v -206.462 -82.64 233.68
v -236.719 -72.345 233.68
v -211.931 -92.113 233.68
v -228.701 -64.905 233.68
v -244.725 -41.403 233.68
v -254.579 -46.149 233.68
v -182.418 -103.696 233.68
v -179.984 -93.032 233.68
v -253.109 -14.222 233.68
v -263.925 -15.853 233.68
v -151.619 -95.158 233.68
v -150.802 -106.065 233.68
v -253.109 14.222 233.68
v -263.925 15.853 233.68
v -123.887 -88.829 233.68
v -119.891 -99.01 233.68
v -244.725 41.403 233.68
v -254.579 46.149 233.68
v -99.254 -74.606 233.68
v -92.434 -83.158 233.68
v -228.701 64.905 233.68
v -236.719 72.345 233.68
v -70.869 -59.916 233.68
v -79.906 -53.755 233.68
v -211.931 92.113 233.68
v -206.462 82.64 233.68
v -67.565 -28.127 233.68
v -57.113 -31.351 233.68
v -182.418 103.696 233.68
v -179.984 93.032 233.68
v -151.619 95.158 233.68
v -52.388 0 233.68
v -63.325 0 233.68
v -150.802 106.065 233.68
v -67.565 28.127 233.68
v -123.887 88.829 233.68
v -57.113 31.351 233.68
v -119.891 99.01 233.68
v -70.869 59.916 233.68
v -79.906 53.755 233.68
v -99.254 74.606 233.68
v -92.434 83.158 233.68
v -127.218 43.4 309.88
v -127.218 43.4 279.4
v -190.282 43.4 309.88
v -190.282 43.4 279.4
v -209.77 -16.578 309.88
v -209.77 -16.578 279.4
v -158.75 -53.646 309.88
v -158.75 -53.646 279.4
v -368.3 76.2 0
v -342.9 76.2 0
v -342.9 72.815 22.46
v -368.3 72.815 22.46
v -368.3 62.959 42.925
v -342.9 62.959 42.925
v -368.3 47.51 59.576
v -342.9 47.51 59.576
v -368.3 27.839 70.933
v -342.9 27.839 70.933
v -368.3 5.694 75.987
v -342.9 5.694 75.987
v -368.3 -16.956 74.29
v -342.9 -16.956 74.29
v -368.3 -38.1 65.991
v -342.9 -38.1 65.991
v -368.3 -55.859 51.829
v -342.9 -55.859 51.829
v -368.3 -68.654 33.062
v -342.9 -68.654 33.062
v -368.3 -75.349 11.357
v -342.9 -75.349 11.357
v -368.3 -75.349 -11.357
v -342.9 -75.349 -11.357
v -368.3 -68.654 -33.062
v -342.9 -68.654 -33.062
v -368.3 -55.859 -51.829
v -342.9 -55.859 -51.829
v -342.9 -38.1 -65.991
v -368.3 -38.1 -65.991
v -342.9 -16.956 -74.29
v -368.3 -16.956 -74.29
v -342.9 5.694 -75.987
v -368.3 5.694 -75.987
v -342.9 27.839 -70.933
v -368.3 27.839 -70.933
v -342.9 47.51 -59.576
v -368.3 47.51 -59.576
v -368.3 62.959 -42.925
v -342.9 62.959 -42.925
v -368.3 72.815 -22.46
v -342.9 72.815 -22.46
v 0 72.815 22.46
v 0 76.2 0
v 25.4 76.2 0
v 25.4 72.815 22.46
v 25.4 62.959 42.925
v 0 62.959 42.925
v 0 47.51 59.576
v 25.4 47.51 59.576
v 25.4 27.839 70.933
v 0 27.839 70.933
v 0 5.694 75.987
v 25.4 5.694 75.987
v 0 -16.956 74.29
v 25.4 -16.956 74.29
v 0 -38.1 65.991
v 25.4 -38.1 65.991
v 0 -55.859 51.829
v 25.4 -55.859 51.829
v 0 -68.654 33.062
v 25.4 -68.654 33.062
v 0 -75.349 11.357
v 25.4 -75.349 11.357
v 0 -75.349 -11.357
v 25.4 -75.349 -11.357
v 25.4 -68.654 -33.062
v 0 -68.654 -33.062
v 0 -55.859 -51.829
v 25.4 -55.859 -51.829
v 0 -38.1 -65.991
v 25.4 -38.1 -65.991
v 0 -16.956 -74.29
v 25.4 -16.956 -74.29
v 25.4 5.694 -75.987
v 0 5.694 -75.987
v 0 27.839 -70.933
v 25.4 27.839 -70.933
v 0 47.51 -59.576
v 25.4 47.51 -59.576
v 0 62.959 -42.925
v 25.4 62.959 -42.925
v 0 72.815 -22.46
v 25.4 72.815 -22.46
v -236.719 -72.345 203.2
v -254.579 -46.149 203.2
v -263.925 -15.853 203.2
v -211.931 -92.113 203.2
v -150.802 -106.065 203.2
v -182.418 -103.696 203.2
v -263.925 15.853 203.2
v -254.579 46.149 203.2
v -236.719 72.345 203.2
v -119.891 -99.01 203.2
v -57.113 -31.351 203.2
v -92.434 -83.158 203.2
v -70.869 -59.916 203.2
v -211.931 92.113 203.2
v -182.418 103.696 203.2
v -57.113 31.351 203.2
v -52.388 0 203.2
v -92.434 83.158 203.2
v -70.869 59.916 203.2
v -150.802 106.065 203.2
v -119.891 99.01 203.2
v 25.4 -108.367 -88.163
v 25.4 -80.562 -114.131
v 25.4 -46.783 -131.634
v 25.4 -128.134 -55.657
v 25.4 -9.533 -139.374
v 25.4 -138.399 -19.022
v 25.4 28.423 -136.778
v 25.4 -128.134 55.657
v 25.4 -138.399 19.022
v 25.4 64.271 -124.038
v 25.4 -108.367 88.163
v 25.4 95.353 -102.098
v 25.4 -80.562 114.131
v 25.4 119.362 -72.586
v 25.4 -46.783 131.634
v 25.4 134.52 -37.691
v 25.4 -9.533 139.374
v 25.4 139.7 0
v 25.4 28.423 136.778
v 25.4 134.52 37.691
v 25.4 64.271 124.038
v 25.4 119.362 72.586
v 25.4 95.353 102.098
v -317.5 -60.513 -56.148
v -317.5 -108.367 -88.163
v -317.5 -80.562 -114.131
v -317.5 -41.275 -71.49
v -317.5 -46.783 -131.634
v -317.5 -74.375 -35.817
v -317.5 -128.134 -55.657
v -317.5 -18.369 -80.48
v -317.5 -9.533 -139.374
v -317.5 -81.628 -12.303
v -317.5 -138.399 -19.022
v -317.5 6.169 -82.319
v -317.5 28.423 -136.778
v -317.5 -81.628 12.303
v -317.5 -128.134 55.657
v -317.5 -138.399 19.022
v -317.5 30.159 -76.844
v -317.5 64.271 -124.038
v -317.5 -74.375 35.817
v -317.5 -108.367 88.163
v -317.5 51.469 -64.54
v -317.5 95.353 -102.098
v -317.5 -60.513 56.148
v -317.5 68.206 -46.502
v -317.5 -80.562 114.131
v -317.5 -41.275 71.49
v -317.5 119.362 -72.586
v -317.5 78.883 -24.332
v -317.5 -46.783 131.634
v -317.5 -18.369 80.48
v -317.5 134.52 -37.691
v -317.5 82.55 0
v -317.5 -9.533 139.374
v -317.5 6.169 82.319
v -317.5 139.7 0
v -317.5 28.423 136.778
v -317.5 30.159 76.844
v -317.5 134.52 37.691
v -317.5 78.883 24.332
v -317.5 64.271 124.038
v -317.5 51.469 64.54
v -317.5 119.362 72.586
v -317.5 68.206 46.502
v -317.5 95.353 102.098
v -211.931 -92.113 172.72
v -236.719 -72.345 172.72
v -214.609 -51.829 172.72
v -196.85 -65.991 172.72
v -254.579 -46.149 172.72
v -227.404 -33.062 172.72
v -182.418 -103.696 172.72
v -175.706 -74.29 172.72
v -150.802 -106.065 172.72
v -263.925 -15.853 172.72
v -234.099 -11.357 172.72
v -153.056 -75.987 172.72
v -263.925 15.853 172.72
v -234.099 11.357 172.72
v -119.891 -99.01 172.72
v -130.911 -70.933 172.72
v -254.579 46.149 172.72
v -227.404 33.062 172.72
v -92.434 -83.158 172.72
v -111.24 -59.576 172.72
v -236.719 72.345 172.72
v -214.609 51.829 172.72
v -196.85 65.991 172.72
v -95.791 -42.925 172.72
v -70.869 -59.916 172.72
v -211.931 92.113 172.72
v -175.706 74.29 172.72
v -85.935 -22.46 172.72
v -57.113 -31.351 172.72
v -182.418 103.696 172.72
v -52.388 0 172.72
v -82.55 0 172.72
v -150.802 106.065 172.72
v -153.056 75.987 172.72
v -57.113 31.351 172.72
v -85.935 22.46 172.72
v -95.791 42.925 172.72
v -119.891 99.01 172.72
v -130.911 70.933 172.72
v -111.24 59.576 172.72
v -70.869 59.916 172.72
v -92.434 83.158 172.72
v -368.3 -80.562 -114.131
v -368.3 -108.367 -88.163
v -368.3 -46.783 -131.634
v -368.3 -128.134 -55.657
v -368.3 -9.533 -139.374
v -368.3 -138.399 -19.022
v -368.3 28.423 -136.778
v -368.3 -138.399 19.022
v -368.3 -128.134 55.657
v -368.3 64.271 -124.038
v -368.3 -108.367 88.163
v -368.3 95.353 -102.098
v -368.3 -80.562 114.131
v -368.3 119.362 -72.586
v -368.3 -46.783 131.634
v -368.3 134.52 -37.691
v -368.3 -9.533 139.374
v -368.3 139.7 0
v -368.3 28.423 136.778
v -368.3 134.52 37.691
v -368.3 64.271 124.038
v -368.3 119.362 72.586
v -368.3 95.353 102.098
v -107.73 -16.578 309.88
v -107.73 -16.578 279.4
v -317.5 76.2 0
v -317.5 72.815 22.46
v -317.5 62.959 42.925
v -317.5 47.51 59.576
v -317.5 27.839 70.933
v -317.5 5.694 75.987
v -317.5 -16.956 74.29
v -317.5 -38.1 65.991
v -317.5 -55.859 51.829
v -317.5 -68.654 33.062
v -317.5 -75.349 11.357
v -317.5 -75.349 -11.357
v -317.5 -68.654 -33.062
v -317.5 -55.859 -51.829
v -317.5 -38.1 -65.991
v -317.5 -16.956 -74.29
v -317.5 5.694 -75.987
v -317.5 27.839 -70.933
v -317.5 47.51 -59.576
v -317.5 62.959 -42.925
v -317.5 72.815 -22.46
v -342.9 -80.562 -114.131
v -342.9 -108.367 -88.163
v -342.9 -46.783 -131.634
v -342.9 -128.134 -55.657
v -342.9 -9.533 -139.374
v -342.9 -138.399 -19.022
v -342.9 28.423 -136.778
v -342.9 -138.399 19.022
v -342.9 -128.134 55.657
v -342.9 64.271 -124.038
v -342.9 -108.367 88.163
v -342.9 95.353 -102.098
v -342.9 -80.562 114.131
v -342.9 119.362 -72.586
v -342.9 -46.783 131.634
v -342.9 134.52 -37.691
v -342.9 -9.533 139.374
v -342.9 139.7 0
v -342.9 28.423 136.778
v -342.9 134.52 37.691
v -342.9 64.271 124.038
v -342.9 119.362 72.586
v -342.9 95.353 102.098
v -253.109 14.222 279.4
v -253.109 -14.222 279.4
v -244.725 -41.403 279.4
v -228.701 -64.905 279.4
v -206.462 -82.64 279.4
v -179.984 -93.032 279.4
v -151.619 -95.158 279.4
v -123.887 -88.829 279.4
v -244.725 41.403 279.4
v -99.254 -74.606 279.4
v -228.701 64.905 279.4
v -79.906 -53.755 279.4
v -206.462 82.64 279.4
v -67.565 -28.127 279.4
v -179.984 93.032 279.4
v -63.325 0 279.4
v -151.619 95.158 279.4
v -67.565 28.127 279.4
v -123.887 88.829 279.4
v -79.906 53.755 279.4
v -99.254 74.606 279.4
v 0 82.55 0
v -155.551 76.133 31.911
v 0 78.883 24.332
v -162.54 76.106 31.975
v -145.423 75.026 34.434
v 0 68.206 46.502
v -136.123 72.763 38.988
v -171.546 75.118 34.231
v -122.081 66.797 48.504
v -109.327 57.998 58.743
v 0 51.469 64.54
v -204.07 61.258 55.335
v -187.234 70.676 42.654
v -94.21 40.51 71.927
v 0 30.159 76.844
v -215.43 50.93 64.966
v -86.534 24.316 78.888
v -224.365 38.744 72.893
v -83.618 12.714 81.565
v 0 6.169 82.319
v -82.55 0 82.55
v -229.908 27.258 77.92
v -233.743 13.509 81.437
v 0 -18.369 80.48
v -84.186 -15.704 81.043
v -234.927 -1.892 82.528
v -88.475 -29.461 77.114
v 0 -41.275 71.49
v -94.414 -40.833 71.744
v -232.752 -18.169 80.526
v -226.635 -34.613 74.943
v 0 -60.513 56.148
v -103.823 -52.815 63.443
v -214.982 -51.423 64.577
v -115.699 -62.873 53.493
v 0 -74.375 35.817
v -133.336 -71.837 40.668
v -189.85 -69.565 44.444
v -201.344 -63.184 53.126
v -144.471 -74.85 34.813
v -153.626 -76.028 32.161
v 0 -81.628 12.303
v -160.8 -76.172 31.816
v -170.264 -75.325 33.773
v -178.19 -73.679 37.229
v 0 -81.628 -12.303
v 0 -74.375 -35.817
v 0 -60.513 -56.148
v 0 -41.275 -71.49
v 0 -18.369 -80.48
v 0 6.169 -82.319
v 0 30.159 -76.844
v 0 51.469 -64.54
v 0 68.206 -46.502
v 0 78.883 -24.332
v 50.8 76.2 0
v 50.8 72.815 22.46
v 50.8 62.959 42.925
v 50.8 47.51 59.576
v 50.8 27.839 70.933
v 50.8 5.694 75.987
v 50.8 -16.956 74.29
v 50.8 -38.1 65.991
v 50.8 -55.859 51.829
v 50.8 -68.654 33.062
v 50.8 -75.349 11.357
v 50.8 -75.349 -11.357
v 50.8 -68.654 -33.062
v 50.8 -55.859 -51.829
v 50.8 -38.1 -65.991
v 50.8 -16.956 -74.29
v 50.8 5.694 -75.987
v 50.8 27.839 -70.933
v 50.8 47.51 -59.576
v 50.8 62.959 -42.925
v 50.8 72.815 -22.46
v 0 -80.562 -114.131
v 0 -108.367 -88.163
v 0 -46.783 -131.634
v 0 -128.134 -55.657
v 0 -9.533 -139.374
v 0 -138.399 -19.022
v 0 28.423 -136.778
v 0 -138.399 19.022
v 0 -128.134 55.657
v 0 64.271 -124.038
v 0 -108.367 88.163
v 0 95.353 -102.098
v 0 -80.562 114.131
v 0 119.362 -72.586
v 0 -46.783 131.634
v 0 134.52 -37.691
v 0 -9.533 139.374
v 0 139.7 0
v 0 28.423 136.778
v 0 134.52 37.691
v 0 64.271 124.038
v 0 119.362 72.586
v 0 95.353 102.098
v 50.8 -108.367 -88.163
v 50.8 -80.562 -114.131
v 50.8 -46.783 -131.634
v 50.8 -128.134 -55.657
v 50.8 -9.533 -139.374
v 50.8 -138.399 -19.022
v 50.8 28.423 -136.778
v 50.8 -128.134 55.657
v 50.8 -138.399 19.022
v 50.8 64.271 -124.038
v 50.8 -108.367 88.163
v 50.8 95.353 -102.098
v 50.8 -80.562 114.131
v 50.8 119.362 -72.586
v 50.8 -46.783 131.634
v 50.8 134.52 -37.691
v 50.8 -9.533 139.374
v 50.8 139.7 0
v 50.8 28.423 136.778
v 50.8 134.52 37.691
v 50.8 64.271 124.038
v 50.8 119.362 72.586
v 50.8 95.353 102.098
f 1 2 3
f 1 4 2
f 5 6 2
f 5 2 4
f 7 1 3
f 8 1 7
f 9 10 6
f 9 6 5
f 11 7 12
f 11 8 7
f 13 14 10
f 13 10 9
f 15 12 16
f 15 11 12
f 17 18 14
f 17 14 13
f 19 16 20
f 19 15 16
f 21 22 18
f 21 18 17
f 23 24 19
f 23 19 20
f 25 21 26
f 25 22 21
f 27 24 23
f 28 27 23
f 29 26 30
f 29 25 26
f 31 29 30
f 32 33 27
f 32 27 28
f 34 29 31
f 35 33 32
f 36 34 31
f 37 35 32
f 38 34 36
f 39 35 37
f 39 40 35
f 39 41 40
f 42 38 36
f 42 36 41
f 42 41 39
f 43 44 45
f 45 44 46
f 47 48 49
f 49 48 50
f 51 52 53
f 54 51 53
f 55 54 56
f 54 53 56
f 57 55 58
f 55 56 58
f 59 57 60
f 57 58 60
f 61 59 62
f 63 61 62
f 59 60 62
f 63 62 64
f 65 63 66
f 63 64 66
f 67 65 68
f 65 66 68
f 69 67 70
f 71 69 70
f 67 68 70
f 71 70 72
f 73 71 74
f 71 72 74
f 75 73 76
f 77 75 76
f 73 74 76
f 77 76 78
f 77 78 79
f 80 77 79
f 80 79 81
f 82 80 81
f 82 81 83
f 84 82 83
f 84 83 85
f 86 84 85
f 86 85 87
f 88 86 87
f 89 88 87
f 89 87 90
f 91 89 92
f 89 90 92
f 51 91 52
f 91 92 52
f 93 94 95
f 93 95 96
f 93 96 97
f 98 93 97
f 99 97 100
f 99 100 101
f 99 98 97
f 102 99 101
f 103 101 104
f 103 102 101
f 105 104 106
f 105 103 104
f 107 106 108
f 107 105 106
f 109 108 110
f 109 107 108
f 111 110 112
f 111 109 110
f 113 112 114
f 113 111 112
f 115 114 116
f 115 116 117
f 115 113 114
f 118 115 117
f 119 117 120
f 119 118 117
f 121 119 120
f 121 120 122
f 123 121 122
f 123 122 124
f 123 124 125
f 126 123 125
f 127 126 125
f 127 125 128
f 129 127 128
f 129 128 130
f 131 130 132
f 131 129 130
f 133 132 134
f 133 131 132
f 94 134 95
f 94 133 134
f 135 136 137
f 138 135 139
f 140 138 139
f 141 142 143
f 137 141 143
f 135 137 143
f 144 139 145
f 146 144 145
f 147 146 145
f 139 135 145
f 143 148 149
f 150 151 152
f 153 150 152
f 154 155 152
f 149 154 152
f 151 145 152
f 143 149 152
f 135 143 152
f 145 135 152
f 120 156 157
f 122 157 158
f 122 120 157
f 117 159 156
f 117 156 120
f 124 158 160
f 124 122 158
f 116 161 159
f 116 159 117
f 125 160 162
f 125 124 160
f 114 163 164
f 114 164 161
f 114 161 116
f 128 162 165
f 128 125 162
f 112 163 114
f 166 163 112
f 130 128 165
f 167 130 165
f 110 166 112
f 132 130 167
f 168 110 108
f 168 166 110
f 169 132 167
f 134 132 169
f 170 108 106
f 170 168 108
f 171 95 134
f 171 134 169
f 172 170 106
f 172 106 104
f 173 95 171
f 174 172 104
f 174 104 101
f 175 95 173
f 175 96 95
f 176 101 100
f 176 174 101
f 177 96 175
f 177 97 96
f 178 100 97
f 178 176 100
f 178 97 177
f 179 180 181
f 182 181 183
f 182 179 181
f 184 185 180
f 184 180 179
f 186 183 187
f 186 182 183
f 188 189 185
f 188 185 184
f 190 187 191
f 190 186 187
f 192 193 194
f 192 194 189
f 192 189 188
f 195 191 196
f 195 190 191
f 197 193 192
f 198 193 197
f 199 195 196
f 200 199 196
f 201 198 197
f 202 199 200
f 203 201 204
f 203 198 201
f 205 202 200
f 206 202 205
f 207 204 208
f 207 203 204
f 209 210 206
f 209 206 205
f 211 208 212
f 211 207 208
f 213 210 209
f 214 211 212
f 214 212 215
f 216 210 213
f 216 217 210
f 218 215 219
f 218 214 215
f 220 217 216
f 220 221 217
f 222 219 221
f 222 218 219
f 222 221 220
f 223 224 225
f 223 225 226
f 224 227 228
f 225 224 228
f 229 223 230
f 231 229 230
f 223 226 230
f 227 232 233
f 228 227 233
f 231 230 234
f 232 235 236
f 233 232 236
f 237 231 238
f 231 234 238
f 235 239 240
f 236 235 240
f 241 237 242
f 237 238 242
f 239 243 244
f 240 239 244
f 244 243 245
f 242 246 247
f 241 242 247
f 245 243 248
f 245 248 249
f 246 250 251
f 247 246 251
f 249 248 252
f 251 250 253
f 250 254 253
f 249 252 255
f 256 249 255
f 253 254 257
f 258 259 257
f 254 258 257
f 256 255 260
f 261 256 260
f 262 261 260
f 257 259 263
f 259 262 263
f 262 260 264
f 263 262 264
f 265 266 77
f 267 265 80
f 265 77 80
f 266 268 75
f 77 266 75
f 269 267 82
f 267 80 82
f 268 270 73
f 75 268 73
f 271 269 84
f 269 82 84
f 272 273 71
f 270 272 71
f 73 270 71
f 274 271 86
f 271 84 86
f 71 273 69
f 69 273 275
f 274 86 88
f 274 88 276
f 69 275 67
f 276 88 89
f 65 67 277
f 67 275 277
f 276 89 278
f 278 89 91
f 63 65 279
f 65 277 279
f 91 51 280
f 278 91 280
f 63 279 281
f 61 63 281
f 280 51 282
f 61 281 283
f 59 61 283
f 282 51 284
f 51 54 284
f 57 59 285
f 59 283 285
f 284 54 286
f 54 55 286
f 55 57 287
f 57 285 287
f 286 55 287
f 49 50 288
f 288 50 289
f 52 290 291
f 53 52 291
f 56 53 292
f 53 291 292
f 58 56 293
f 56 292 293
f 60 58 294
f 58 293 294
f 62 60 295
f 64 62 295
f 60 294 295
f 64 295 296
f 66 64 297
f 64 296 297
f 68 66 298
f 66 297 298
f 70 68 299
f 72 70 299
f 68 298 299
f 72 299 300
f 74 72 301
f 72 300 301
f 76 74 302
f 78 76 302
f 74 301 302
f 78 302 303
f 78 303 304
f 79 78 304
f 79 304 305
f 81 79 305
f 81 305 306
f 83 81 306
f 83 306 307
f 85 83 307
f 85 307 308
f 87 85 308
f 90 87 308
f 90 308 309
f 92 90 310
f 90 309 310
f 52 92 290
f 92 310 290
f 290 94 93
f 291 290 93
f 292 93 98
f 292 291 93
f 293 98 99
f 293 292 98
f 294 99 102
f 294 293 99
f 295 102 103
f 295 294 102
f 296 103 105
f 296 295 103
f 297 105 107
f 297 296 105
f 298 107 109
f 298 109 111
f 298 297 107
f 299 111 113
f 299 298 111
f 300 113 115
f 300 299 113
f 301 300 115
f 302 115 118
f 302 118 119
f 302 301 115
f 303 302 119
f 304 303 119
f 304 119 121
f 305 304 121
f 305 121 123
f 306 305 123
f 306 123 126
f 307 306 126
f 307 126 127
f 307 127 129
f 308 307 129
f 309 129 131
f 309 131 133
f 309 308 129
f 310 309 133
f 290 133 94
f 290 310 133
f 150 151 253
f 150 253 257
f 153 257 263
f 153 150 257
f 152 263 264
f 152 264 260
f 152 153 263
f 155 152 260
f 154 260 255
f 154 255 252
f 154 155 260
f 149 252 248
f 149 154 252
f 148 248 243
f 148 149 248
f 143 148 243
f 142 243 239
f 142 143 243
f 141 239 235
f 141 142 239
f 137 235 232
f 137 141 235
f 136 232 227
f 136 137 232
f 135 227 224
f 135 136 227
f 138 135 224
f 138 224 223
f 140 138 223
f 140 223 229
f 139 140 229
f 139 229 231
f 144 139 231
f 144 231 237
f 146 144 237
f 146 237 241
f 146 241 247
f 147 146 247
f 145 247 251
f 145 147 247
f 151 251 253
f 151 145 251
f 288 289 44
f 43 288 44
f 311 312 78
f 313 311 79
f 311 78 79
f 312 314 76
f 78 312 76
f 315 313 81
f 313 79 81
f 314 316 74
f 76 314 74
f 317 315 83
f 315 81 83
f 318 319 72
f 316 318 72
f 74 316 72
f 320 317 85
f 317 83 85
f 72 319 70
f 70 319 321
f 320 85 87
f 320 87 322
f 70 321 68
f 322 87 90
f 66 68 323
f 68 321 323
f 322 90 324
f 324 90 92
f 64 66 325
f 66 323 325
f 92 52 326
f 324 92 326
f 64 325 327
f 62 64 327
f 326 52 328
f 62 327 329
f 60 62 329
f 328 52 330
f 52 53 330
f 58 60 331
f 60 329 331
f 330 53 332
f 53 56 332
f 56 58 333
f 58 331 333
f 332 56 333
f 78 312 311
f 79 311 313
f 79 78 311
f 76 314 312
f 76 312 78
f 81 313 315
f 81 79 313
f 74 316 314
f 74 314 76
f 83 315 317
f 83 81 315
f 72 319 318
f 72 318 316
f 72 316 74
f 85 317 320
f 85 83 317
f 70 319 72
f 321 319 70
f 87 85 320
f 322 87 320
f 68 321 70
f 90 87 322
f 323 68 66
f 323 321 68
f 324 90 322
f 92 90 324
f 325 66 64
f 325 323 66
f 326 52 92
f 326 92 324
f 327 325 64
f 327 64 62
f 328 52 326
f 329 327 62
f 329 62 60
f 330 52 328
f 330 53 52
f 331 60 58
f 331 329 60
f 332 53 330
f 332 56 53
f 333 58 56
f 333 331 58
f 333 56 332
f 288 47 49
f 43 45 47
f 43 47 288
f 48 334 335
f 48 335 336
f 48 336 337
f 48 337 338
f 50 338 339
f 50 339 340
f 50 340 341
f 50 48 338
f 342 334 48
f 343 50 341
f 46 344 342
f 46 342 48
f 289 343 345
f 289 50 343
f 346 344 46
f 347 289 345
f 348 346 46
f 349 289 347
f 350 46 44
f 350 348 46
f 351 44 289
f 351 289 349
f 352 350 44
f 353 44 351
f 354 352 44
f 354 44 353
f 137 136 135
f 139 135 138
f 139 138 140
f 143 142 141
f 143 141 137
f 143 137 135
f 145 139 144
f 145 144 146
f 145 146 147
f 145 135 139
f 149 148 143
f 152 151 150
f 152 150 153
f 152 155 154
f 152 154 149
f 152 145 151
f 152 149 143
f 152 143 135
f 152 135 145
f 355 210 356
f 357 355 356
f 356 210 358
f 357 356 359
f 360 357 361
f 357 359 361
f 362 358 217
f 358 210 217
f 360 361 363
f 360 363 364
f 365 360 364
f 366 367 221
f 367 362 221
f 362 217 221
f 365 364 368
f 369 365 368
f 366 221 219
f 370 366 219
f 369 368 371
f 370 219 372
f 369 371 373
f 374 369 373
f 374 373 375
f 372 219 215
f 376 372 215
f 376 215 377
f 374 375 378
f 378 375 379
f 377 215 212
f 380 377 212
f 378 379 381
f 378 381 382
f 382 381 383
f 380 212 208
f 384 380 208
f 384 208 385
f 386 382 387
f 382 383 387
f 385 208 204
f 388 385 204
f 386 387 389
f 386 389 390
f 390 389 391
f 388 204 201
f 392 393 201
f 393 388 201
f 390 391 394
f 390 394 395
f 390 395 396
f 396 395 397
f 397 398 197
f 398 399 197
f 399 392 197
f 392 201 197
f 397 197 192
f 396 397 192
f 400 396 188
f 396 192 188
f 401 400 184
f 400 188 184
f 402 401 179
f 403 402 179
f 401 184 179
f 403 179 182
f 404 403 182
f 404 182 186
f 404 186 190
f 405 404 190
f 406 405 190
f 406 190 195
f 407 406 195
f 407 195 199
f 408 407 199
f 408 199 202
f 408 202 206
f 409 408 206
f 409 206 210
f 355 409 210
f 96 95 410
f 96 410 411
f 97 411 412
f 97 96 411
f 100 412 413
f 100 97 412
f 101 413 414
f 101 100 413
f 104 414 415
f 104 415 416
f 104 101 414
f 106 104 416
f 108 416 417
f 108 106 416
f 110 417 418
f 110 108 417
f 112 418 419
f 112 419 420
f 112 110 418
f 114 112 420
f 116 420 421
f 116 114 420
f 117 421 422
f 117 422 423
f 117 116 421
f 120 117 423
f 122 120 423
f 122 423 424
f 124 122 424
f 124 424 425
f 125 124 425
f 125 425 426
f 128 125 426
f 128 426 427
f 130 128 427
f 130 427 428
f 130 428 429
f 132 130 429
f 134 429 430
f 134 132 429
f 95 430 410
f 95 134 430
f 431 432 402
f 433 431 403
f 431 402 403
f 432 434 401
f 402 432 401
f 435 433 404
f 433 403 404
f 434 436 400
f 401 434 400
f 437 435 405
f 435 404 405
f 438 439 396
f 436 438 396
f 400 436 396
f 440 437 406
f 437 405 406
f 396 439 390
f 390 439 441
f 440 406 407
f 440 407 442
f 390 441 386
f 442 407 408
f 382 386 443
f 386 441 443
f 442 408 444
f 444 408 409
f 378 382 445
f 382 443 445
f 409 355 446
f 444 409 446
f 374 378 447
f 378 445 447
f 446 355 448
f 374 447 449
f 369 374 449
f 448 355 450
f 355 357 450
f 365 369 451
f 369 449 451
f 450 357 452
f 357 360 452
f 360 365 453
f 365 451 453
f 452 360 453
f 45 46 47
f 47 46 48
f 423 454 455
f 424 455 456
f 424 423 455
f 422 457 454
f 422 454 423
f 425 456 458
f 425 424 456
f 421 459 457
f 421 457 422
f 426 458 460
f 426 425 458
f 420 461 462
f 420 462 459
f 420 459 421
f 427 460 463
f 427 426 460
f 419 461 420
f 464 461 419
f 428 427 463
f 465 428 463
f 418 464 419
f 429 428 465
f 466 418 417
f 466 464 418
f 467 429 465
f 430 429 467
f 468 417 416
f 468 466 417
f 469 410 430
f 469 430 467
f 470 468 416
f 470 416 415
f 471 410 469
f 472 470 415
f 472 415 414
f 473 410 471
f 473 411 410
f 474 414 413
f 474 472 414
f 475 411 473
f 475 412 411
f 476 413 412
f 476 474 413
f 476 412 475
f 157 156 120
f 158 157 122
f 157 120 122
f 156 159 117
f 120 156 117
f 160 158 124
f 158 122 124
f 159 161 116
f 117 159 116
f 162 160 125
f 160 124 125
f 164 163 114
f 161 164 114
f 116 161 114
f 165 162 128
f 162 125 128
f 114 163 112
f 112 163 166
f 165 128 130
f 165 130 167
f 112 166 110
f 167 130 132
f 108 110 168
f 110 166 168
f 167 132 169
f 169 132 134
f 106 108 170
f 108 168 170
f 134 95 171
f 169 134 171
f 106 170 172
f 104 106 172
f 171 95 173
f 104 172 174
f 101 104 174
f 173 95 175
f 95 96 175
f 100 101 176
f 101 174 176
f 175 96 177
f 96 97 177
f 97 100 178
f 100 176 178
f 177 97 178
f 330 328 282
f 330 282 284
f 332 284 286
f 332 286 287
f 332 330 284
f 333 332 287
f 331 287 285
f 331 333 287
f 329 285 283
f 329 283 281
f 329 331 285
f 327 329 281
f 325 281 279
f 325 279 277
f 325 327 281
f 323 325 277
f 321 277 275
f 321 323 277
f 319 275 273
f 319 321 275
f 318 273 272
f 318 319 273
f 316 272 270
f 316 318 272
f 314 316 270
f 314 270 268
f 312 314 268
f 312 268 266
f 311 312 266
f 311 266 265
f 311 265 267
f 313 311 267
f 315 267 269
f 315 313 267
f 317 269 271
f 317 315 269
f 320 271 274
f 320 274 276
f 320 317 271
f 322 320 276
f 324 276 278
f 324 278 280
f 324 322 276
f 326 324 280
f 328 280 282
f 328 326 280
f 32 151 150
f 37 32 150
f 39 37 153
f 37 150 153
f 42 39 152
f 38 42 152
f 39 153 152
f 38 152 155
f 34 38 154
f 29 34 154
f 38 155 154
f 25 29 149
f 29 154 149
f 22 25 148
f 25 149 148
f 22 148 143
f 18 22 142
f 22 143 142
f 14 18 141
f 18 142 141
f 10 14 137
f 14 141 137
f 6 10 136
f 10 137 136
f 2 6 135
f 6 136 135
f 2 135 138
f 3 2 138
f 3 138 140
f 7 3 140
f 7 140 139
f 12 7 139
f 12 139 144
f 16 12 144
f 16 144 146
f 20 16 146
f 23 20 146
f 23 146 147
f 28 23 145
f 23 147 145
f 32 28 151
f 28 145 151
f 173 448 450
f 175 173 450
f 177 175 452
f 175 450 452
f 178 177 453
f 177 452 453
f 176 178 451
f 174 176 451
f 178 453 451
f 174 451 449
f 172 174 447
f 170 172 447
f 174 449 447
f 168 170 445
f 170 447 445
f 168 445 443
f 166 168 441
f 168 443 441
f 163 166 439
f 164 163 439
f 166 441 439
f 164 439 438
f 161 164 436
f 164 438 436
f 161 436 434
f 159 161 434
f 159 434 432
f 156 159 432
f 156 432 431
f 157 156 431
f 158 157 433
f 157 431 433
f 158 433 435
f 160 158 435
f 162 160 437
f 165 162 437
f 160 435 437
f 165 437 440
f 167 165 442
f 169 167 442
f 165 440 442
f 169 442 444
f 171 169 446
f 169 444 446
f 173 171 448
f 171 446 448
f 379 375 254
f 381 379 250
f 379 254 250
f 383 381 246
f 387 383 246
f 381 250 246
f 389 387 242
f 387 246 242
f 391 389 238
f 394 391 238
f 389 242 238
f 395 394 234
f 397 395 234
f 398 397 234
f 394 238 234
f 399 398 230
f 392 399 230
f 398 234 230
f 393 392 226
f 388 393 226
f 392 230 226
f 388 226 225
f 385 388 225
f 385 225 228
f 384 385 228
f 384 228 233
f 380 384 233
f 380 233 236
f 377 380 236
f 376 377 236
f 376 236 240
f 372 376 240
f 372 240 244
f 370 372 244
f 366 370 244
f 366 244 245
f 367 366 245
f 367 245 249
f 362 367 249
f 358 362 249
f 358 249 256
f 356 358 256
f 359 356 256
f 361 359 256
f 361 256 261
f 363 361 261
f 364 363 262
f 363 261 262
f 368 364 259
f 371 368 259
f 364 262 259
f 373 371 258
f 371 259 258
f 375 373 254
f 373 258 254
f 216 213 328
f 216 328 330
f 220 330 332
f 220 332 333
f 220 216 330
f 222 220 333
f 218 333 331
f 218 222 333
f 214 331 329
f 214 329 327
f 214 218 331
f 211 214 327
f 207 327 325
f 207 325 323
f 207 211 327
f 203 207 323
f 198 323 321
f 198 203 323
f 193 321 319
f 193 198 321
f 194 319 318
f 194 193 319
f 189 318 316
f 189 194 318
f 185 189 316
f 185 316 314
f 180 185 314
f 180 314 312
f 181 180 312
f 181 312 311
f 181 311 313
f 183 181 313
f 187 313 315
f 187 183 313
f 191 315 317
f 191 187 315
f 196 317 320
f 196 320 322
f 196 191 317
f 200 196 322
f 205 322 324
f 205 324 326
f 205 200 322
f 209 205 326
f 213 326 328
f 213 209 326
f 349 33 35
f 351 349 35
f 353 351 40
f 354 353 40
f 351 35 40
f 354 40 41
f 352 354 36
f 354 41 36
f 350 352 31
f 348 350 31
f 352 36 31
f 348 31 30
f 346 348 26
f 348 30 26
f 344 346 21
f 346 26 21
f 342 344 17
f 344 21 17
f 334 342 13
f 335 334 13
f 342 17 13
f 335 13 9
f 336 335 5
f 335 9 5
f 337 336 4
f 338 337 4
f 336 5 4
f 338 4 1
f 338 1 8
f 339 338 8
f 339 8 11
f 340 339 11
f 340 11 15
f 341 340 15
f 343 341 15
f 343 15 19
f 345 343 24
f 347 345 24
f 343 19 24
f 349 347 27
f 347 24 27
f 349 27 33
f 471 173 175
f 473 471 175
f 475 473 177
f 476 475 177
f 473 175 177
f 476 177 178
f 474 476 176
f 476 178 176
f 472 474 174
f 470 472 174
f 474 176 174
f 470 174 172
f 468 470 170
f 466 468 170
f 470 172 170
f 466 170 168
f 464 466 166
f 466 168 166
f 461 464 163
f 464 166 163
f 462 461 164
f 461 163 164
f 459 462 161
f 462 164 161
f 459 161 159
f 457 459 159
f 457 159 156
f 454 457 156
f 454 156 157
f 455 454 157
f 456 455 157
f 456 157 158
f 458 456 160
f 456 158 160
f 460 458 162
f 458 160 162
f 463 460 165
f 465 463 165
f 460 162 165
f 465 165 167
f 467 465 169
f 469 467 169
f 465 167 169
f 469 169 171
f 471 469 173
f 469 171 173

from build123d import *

# Parameters (mm, degrees)
F0_R      = 139.7
F0_R_2    = 76.2
F1_DEPTH  = 25.4
F3_R      = 139.7
F3_R_2    = 76.2
F4_DEPTH  = 25.4
F6_DEPTH  = 25.4
F7_DEPTH  = 25.4
F9_R      = 82.55
F9_R_2    = 76.2
F10_DEPTH = 317.5
F12_R     = 106.3625
F13_DEPTH = 30.48
F14_R     = 76.2
F15_REACH = 527.9471469057
F16_DEPTH = 30.48
F17_R     = 95.4249040927
F18_DEPTH = 45.72
F20_DEPTH = 30.48


with BuildPart() as f1:
    # F0 (on Right) → F1 (new body)
    with BuildSketch(Plane.YZ):
        Circle(F0_R)
        Circle(F0_R_2, mode=Mode.SUBTRACT)
    extrude(amount=F1_DEPTH)


with BuildPart() as f4:
    # F3 (on offset) → F4 (new body)
    with BuildSketch(Plane.YZ.offset(-317.5)):
        Circle(F3_R)
        Circle(F3_R_2, mode=Mode.SUBTRACT)
    extrude(amount=-F4_DEPTH)


with BuildPart() as f6:
    # F6 (new): a face of the model
    f6_faces = [f4.part.faces().sort_by_distance(p)[0] for p in [
        (-342.9, -135.7486873067, 0),
    ]]
    extrude(f6_faces, amount=F6_DEPTH)


with BuildPart() as f7:
    # F7 (new): a face of the model
    f7_faces = [f1.part.faces().sort_by_distance(p)[0] for p in [
        (25.4, -135.7486873067, 0),
    ]]
    extrude(f7_faces, amount=F7_DEPTH)


with BuildPart() as f1_1:
    add(f1.part)

    add(f4.part)  # F10 merges F4
    # F9 (on face) → F10 (join, through all)
    with BuildSketch(Plane.YZ.offset(-317.5)):
        Circle(F9_R)
        Circle(F9_R_2, mode=Mode.SUBTRACT)
    extrude(amount=F10_DEPTH)



with BuildPart() as f13:
    # F12 (on offset) → F13 (new body)
    with BuildSketch(Plane.XY.offset(203.2)):
        with Locations((-158.75, 0)):
            Circle(F12_R)
    extrude(amount=-F13_DEPTH)


with BuildPart() as f1_2:
    add(f1_1.part)

    add(f13.part)  # F15 merges F13
    f15_end = f1_2.faces().sort_by_distance((-158.75, -82.55, 0))[0]
    # F14 (on face) → F15 (join, up to a face of the model that its end follows)
    with BuildSketch(Plane(origin=(0, 0, 172.72), x_dir=(1, 0, 0), z_dir=(0, 0, -1))):
        with Locations((-158.75, 0)):
            Circle(F14_R)
    f15_long = extrude(amount=F15_REACH, mode=Mode.PRIVATE)
    add(split(f15_long, bisect_by=f15_end, keep=Keep.ALL, mode=Mode.PRIVATE).solids().sort_by_distance((-158.75, 0, 172.72))[0])


with BuildPart() as f16:
    # F16 (new): a face of the model
    f16_faces = [f1_2.part.faces().sort_by_distance(p)[0] for p in [
        (-158.75, 0, 203.2),
    ]]
    extrude(f16_faces, amount=F16_DEPTH)

    # F17 (on face) → F18 (join)
    with BuildSketch(Plane.XY.offset(233.68)):
        with Locations((-158.75, 0)):
            Circle(F17_R)
    extrude(amount=F18_DEPTH)

    # F19 (on face) → F20 (join)
    with BuildSketch(Plane.XY.offset(279.4)):
        Polygon((-127.2176910353, 43.4004999697), (-190.2823089647, 43.4004999697), (-209.7703476486, -16.5775158597), (-158.75, -53.6459682201), (-107.7296523514, -16.5775158597), align=None)
    extrude(amount=F20_DEPTH)


solid = Compound([f6.part, f7.part, f1_2.part, f16.part])
